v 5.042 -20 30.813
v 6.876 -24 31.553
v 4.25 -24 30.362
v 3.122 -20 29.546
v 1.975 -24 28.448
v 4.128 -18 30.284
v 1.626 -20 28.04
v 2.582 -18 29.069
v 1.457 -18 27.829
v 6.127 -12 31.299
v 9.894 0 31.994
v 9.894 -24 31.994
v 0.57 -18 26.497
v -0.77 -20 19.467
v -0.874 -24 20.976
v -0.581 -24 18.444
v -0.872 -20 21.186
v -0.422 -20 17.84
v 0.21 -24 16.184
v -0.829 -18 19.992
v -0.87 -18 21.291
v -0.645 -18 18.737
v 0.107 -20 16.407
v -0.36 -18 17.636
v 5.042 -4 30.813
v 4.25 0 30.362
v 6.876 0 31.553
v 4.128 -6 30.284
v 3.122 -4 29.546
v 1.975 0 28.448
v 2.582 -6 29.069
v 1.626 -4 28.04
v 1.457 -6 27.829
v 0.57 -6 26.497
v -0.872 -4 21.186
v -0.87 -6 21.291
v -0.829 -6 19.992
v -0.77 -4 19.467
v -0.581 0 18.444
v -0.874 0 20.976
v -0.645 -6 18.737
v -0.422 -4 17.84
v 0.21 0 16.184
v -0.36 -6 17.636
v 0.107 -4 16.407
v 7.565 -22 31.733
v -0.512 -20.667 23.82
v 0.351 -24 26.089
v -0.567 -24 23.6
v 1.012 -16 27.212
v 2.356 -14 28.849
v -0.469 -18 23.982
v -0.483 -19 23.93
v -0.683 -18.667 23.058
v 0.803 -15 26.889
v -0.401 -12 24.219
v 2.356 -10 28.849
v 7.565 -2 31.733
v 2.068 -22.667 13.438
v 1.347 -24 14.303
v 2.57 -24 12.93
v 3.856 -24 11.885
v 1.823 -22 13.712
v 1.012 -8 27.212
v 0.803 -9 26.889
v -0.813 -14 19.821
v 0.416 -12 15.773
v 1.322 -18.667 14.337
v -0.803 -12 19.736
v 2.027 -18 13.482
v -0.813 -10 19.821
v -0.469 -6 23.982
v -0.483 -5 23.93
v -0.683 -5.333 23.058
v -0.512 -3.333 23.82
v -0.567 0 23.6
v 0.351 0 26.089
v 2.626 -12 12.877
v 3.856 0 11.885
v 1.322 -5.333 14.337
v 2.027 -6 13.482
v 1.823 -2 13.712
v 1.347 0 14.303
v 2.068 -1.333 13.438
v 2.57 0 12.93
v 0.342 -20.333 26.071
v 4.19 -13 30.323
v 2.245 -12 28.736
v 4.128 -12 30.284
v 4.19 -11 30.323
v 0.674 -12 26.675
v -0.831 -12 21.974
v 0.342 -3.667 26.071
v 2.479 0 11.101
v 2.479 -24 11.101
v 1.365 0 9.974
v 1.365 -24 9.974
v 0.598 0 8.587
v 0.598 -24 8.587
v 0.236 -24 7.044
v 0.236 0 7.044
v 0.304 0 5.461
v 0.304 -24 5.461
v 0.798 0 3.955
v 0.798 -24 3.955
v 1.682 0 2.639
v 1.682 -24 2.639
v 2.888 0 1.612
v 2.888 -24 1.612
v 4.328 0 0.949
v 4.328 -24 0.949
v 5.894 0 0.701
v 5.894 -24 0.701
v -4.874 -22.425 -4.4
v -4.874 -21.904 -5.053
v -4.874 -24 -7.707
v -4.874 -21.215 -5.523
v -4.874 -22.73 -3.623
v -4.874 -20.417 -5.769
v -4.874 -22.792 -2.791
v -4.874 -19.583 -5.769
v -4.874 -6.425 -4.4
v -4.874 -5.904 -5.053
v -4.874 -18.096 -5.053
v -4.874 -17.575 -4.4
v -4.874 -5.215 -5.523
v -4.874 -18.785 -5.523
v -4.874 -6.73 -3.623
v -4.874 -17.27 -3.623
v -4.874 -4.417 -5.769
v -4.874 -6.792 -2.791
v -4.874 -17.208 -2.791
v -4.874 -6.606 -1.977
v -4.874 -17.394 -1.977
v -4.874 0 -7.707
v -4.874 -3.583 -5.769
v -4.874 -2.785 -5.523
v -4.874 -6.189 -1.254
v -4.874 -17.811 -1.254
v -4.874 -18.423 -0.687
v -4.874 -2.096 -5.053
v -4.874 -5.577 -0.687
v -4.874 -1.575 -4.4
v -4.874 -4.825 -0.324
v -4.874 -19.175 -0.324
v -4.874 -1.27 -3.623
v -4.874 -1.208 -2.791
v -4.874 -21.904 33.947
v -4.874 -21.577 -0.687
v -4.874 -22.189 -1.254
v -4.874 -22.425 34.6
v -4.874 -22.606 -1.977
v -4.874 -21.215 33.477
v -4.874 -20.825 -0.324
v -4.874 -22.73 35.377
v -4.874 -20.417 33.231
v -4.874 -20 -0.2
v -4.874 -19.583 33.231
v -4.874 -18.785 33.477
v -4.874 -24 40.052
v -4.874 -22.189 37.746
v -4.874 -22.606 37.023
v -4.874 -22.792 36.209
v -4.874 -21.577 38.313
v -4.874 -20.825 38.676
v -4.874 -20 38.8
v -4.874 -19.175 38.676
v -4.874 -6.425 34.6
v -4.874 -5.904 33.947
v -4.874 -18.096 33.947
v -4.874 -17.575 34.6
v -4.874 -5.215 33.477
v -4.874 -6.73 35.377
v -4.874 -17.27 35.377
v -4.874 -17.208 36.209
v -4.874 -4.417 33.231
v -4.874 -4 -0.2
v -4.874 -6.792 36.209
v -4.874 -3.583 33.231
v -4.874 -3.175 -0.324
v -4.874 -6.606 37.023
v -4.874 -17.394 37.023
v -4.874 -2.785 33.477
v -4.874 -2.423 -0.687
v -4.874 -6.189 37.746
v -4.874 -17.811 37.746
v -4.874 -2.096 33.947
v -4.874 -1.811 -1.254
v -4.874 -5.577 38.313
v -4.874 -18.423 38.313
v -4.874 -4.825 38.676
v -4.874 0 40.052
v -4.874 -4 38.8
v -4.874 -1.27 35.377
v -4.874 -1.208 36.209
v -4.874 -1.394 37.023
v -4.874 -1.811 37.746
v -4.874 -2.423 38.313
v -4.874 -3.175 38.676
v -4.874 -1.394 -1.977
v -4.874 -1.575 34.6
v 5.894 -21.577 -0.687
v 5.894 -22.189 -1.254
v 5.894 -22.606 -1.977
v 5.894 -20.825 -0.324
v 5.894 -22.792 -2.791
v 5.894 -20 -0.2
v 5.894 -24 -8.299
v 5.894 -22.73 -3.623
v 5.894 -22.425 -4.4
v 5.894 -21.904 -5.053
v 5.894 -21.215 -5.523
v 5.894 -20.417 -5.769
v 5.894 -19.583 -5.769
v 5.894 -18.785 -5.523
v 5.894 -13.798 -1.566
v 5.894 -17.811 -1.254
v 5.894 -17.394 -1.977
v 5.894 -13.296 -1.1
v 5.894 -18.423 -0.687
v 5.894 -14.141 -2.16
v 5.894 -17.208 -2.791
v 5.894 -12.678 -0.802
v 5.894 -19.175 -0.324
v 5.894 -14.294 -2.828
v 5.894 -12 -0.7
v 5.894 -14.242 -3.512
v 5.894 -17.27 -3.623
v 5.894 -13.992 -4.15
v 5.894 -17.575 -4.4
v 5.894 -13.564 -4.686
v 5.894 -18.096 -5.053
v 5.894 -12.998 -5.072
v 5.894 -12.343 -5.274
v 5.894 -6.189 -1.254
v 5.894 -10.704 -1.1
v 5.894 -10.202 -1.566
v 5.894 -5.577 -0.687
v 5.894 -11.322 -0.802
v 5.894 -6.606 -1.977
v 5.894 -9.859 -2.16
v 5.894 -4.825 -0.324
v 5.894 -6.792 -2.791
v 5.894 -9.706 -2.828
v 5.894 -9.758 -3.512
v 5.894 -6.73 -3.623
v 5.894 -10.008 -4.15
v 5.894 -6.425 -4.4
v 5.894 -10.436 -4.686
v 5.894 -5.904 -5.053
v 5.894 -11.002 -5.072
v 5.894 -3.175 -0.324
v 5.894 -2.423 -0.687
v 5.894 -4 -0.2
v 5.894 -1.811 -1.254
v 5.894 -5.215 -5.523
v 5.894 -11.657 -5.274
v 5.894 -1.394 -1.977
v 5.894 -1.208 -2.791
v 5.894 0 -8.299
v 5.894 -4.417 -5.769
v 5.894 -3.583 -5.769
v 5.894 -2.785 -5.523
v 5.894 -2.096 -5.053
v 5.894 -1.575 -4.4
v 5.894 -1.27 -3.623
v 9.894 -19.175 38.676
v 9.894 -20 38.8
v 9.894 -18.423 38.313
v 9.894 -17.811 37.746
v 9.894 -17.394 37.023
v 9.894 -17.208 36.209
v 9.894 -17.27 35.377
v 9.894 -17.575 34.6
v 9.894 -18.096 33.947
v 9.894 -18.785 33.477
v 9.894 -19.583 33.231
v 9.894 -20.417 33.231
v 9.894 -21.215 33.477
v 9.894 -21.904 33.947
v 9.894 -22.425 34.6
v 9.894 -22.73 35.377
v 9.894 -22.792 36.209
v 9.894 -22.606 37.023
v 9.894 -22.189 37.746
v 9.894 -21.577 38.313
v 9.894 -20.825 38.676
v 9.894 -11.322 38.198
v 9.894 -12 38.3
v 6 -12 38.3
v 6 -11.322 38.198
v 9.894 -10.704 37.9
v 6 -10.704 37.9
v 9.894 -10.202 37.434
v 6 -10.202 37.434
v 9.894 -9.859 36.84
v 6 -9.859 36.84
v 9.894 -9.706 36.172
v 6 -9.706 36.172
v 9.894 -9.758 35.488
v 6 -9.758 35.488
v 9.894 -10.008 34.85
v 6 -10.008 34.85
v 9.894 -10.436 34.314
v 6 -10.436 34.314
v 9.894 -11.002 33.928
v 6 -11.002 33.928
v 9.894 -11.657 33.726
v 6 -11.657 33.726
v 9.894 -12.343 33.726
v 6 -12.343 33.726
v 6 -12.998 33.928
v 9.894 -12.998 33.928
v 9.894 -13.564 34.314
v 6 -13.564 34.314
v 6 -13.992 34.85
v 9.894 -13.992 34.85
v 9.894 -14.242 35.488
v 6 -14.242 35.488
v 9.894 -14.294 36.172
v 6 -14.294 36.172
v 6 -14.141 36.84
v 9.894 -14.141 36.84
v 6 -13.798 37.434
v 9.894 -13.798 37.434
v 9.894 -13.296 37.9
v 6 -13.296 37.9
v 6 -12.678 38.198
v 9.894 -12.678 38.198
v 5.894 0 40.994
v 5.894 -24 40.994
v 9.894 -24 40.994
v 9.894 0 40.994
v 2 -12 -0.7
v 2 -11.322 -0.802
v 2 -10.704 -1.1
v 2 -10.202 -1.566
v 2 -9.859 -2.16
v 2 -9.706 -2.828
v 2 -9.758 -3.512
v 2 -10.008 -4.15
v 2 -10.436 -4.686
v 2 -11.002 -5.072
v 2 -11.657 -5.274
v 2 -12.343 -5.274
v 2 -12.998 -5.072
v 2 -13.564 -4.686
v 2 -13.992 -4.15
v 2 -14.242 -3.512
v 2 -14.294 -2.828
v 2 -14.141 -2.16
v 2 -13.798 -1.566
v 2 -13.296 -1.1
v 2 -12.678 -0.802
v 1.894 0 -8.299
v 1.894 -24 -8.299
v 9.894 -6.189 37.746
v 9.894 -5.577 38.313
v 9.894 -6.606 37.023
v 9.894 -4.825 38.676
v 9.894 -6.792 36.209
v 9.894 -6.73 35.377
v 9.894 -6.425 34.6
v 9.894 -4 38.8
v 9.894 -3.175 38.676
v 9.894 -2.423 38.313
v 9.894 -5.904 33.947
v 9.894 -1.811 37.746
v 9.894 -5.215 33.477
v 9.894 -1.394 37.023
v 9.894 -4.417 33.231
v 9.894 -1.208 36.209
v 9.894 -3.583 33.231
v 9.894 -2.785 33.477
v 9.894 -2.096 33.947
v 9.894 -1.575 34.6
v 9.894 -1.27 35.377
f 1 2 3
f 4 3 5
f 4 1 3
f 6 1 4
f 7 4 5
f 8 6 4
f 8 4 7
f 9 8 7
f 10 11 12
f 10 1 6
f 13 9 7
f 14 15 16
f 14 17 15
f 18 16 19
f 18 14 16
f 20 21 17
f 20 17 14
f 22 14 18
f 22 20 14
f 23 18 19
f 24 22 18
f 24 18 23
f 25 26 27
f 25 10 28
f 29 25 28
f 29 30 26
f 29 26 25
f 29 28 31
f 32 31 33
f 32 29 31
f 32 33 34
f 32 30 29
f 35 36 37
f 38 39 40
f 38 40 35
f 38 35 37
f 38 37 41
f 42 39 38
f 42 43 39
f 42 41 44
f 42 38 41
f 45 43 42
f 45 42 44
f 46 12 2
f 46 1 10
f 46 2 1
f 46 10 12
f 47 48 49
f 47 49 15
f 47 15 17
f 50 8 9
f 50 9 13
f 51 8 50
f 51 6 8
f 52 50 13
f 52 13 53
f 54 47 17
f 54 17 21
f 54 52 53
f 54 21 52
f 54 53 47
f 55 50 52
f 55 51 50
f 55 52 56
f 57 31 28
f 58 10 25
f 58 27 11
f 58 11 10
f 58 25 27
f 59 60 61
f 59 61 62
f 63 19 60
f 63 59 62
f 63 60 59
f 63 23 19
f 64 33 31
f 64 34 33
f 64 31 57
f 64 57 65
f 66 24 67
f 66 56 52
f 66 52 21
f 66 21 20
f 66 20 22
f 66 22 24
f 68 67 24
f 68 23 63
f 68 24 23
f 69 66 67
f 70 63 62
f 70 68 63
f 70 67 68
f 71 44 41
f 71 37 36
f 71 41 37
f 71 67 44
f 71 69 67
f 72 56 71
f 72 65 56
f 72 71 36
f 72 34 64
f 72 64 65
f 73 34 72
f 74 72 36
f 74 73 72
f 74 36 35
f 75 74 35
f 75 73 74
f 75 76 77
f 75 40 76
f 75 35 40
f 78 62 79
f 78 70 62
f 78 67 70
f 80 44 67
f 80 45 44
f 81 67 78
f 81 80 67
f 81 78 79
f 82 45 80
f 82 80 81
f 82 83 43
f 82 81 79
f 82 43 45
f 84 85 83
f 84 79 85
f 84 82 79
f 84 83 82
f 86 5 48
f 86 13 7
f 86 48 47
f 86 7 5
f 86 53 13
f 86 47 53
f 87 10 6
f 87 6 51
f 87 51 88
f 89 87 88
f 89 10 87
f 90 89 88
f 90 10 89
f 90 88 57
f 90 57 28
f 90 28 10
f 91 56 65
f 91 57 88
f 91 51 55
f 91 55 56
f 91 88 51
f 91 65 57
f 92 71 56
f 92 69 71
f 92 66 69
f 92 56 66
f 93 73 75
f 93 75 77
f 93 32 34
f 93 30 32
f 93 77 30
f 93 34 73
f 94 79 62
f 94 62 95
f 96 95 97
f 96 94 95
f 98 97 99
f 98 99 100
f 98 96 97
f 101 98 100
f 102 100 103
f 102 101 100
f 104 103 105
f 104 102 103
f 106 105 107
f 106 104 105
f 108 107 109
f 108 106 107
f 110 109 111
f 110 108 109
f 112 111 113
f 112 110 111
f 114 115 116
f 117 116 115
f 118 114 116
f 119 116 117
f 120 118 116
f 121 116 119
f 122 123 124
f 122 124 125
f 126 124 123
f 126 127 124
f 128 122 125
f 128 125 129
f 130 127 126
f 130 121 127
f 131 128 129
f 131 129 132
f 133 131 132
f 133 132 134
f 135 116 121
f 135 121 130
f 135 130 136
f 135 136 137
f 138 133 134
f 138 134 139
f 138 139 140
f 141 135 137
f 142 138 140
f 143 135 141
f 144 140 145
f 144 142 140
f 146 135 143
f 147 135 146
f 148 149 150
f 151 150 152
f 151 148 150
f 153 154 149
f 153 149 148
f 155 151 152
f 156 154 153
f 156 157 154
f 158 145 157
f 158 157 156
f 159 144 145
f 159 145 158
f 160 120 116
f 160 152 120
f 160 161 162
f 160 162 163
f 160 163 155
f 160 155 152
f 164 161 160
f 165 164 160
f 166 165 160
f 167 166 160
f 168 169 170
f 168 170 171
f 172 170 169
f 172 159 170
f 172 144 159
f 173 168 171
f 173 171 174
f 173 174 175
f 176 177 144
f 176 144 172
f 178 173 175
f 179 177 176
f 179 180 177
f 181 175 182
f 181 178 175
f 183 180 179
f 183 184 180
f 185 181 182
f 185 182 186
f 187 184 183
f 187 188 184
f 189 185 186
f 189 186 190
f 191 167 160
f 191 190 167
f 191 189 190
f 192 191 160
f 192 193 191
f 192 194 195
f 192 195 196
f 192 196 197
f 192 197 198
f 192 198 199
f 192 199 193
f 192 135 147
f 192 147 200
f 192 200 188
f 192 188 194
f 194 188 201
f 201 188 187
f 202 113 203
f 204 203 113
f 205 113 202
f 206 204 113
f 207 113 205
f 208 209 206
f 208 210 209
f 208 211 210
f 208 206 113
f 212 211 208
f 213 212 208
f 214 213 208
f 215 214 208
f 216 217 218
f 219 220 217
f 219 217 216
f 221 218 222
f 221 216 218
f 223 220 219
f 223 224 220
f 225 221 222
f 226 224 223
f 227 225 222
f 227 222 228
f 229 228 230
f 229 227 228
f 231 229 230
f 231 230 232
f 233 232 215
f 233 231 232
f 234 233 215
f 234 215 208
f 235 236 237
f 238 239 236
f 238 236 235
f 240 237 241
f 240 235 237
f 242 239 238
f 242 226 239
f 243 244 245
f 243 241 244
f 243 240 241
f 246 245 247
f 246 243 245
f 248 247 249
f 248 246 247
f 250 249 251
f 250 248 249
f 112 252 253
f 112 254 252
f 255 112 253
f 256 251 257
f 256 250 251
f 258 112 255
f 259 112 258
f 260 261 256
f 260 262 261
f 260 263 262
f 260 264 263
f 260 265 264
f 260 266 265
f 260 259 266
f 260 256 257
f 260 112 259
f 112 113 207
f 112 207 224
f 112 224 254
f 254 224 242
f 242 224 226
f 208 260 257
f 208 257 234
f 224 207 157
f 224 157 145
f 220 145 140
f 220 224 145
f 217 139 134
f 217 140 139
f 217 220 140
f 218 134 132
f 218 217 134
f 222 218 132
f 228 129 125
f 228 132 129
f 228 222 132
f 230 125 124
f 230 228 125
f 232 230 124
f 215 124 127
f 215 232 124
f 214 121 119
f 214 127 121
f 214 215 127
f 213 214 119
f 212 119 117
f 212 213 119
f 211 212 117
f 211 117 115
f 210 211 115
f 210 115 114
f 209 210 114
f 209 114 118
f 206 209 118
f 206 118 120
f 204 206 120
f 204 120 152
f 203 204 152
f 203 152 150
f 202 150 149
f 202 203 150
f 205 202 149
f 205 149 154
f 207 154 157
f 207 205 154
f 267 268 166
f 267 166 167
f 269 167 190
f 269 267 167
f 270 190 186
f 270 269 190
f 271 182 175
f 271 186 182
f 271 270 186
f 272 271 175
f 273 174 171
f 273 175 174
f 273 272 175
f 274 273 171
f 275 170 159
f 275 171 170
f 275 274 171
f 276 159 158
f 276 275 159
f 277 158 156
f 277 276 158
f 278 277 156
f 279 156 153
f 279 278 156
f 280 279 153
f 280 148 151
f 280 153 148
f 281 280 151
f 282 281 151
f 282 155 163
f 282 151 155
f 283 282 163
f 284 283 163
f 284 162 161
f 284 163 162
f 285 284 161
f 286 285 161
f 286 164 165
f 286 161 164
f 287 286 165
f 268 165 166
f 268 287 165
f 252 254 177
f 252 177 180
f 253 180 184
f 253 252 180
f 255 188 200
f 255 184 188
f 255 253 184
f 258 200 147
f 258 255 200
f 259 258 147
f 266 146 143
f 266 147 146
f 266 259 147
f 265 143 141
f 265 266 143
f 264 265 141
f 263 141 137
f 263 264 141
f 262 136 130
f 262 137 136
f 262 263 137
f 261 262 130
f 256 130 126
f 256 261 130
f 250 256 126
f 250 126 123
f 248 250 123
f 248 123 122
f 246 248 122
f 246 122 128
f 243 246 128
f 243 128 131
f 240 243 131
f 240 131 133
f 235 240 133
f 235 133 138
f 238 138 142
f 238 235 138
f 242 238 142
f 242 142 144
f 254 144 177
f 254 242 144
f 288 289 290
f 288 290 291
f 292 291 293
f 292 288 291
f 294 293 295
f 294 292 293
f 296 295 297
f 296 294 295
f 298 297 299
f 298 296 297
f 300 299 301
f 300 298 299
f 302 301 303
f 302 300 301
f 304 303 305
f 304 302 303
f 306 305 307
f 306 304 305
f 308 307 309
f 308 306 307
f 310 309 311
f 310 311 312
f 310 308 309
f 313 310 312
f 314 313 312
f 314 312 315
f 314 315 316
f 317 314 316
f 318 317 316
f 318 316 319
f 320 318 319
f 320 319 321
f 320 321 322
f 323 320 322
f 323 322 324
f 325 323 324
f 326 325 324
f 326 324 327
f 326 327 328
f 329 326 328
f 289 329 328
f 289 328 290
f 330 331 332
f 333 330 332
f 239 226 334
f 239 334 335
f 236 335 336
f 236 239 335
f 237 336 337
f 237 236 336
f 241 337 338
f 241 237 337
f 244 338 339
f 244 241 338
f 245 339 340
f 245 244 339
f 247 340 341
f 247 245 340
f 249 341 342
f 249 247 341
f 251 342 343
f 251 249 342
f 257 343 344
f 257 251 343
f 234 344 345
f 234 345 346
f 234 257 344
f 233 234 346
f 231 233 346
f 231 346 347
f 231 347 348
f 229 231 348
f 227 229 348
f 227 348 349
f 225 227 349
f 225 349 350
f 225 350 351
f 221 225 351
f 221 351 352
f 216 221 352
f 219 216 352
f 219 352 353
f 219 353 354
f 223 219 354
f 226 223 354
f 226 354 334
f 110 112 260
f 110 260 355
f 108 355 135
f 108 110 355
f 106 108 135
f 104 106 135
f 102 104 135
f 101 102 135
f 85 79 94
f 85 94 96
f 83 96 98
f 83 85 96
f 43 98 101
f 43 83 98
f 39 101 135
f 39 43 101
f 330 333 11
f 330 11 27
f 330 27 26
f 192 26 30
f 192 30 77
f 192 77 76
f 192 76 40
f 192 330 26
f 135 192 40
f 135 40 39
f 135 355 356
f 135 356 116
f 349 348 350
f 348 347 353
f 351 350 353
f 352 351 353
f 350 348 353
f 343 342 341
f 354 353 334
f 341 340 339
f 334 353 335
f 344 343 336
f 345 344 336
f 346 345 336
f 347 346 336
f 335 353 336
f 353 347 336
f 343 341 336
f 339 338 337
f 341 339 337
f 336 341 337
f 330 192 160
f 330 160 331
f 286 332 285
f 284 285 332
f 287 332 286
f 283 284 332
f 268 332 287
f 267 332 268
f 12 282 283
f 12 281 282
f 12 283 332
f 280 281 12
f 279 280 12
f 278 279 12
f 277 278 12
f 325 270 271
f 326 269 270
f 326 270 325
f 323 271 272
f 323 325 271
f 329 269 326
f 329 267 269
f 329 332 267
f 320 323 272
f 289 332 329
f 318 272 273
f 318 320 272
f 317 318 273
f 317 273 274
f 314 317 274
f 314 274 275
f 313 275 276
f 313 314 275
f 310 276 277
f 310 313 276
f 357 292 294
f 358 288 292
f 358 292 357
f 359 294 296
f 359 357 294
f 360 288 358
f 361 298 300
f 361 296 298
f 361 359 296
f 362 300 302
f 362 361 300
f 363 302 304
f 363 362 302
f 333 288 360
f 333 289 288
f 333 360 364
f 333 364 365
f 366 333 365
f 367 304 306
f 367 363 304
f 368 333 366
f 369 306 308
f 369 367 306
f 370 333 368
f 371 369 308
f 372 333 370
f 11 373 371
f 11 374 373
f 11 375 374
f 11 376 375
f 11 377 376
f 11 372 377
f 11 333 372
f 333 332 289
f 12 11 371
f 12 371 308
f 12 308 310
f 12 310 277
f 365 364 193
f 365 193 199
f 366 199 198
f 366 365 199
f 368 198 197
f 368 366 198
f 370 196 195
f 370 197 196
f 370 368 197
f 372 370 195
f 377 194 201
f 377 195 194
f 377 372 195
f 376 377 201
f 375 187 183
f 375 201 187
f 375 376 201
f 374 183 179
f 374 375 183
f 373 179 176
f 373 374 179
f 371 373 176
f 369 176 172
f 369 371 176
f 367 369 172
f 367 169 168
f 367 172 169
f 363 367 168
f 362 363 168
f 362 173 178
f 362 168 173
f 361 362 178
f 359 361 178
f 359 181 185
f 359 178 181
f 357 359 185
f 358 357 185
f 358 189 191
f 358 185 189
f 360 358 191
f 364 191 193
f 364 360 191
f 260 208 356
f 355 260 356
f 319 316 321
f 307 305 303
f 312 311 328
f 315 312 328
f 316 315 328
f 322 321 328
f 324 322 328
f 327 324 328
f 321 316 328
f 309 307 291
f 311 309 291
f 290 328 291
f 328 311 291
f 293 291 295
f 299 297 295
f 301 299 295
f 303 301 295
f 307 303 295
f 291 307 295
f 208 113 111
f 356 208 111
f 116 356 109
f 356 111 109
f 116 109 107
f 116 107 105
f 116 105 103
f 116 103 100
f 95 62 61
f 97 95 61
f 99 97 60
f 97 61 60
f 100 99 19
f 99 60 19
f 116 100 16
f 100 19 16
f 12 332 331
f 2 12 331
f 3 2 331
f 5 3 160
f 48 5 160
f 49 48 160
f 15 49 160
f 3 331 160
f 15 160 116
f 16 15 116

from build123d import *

# Parameters (mm, degrees)
CYLINDER011_R     = 2.3
CYLINDER011_DEPTH = 39
CYLINDER010_R     = 2.3
CYLINDER010_DEPTH = 35
CYLINDER001_R     = 2.8
CYLINDER001_DEPTH = 60
CYLINDER003_R     = 2.8
CYLINDER003_DEPTH = 60
CYLINDER002_R     = 2.8
CYLINDER002_DEPTH = 60
CYLINDER_R        = 2.8
CYLINDER_DEPTH    = 60
PAD002_DEPTH      = 24


with BuildPart() as passi_pl_kl1:
    # Cylinder011 → Cylinder011 (new body)
    with BuildSketch(Plane(origin=(41, -12, -3), x_dir=(0, 0, 1), z_dir=(-1, 0, 0))):
        Circle(CYLINDER011_R)
    extrude(amount=CYLINDER011_DEPTH)


with BuildPart() as passi_pl_kl0:
    # Cylinder010 → Cylinder010 (new body)
    with BuildSketch(Plane(origin=(41, -12, 36), x_dir=(0, 0, 1), z_dir=(-1, 0, 0))):
        Circle(CYLINDER010_R)
    extrude(amount=CYLINDER010_DEPTH)


with BuildPart() as o2:
    # Cylinder001 → Cylinder001 (new body)
    with BuildSketch(Plane(origin=(41, -4, 36), x_dir=(0, 0, 1), z_dir=(-1, 0, 0))):
        Circle(CYLINDER001_R)
    extrude(amount=CYLINDER001_DEPTH)


with BuildPart() as u002:
    # Cylinder003 → Cylinder003 (new body)
    with BuildSketch(Plane(origin=(41, -20, -3), x_dir=(0, 0, 1), z_dir=(-1, 0, 0))):
        Circle(CYLINDER003_R)
    extrude(amount=CYLINDER003_DEPTH)


with BuildPart() as u001:
    # Cylinder002 → Cylinder002 (new body)
    with BuildSketch(Plane(origin=(41, -4, -3), x_dir=(0, 0, 1), z_dir=(-1, 0, 0))):
        Circle(CYLINDER002_R)
    extrude(amount=CYLINDER002_DEPTH)


with BuildPart() as o1:
    # Cylinder → Cylinder (new body)
    with BuildSketch(Plane(origin=(41, -20, 36), x_dir=(0, 0, 1), z_dir=(-1, 0, 0))):
        Circle(CYLINDER_R)
    extrude(amount=CYLINDER_DEPTH)


with BuildPart() as cut014:
    # Sketch → Pad002 (new body)
    with BuildSketch(Plane.XZ):
        with BuildLine():
            ThreePointArc((3.856276, 11.885302), (0.303894, 5.460599), (5.893532, 0.701169))
            Line((5.893532, 0.701169), (5.893532, -8.298831))
            Line((5.893532, -8.298831), (1.893532, -8.298831))
            Line((1.893532, -8.298831), (-4.873896, -7.706757))
            Line((-4.873896, -7.706757), (-4.873896, 40.051511))
            Line((-4.873896, 40.051511), (5.893532, 40.993539))
            Line((5.893532, 40.993539), (9.893532, 40.993539))
            Line((9.893532, 40.993539), (9.893532, 31.993539))
            add(Edge.make_bspline(
                [(9.893532, 31.993539), (-25.2112, 31.993539), (3.856276, 11.885302)],
                knots=[0, 0, 0, 2.546366, 2.546366, 2.546366], degree=2, weights=[1, 0.293239, 1]))
        make_face()
    extrude(amount=PAD002_DEPTH)

    # Cut: cut O1
    add(o1.part, mode=Mode.SUBTRACT)

    # Cut010: cut U001
    add(u001.part, mode=Mode.SUBTRACT)

    # Cut011: cut U002
    add(u002.part, mode=Mode.SUBTRACT)

    # Cut012: cut O2
    add(o2.part, mode=Mode.SUBTRACT)

    # Cut013: cut PassI_Pl-Kl0
    add(passi_pl_kl0.part, mode=Mode.SUBTRACT)

    # Cut014: cut PassI_Pl-Kl1
    add(passi_pl_kl1.part, mode=Mode.SUBTRACT)


solid = cut014.part
